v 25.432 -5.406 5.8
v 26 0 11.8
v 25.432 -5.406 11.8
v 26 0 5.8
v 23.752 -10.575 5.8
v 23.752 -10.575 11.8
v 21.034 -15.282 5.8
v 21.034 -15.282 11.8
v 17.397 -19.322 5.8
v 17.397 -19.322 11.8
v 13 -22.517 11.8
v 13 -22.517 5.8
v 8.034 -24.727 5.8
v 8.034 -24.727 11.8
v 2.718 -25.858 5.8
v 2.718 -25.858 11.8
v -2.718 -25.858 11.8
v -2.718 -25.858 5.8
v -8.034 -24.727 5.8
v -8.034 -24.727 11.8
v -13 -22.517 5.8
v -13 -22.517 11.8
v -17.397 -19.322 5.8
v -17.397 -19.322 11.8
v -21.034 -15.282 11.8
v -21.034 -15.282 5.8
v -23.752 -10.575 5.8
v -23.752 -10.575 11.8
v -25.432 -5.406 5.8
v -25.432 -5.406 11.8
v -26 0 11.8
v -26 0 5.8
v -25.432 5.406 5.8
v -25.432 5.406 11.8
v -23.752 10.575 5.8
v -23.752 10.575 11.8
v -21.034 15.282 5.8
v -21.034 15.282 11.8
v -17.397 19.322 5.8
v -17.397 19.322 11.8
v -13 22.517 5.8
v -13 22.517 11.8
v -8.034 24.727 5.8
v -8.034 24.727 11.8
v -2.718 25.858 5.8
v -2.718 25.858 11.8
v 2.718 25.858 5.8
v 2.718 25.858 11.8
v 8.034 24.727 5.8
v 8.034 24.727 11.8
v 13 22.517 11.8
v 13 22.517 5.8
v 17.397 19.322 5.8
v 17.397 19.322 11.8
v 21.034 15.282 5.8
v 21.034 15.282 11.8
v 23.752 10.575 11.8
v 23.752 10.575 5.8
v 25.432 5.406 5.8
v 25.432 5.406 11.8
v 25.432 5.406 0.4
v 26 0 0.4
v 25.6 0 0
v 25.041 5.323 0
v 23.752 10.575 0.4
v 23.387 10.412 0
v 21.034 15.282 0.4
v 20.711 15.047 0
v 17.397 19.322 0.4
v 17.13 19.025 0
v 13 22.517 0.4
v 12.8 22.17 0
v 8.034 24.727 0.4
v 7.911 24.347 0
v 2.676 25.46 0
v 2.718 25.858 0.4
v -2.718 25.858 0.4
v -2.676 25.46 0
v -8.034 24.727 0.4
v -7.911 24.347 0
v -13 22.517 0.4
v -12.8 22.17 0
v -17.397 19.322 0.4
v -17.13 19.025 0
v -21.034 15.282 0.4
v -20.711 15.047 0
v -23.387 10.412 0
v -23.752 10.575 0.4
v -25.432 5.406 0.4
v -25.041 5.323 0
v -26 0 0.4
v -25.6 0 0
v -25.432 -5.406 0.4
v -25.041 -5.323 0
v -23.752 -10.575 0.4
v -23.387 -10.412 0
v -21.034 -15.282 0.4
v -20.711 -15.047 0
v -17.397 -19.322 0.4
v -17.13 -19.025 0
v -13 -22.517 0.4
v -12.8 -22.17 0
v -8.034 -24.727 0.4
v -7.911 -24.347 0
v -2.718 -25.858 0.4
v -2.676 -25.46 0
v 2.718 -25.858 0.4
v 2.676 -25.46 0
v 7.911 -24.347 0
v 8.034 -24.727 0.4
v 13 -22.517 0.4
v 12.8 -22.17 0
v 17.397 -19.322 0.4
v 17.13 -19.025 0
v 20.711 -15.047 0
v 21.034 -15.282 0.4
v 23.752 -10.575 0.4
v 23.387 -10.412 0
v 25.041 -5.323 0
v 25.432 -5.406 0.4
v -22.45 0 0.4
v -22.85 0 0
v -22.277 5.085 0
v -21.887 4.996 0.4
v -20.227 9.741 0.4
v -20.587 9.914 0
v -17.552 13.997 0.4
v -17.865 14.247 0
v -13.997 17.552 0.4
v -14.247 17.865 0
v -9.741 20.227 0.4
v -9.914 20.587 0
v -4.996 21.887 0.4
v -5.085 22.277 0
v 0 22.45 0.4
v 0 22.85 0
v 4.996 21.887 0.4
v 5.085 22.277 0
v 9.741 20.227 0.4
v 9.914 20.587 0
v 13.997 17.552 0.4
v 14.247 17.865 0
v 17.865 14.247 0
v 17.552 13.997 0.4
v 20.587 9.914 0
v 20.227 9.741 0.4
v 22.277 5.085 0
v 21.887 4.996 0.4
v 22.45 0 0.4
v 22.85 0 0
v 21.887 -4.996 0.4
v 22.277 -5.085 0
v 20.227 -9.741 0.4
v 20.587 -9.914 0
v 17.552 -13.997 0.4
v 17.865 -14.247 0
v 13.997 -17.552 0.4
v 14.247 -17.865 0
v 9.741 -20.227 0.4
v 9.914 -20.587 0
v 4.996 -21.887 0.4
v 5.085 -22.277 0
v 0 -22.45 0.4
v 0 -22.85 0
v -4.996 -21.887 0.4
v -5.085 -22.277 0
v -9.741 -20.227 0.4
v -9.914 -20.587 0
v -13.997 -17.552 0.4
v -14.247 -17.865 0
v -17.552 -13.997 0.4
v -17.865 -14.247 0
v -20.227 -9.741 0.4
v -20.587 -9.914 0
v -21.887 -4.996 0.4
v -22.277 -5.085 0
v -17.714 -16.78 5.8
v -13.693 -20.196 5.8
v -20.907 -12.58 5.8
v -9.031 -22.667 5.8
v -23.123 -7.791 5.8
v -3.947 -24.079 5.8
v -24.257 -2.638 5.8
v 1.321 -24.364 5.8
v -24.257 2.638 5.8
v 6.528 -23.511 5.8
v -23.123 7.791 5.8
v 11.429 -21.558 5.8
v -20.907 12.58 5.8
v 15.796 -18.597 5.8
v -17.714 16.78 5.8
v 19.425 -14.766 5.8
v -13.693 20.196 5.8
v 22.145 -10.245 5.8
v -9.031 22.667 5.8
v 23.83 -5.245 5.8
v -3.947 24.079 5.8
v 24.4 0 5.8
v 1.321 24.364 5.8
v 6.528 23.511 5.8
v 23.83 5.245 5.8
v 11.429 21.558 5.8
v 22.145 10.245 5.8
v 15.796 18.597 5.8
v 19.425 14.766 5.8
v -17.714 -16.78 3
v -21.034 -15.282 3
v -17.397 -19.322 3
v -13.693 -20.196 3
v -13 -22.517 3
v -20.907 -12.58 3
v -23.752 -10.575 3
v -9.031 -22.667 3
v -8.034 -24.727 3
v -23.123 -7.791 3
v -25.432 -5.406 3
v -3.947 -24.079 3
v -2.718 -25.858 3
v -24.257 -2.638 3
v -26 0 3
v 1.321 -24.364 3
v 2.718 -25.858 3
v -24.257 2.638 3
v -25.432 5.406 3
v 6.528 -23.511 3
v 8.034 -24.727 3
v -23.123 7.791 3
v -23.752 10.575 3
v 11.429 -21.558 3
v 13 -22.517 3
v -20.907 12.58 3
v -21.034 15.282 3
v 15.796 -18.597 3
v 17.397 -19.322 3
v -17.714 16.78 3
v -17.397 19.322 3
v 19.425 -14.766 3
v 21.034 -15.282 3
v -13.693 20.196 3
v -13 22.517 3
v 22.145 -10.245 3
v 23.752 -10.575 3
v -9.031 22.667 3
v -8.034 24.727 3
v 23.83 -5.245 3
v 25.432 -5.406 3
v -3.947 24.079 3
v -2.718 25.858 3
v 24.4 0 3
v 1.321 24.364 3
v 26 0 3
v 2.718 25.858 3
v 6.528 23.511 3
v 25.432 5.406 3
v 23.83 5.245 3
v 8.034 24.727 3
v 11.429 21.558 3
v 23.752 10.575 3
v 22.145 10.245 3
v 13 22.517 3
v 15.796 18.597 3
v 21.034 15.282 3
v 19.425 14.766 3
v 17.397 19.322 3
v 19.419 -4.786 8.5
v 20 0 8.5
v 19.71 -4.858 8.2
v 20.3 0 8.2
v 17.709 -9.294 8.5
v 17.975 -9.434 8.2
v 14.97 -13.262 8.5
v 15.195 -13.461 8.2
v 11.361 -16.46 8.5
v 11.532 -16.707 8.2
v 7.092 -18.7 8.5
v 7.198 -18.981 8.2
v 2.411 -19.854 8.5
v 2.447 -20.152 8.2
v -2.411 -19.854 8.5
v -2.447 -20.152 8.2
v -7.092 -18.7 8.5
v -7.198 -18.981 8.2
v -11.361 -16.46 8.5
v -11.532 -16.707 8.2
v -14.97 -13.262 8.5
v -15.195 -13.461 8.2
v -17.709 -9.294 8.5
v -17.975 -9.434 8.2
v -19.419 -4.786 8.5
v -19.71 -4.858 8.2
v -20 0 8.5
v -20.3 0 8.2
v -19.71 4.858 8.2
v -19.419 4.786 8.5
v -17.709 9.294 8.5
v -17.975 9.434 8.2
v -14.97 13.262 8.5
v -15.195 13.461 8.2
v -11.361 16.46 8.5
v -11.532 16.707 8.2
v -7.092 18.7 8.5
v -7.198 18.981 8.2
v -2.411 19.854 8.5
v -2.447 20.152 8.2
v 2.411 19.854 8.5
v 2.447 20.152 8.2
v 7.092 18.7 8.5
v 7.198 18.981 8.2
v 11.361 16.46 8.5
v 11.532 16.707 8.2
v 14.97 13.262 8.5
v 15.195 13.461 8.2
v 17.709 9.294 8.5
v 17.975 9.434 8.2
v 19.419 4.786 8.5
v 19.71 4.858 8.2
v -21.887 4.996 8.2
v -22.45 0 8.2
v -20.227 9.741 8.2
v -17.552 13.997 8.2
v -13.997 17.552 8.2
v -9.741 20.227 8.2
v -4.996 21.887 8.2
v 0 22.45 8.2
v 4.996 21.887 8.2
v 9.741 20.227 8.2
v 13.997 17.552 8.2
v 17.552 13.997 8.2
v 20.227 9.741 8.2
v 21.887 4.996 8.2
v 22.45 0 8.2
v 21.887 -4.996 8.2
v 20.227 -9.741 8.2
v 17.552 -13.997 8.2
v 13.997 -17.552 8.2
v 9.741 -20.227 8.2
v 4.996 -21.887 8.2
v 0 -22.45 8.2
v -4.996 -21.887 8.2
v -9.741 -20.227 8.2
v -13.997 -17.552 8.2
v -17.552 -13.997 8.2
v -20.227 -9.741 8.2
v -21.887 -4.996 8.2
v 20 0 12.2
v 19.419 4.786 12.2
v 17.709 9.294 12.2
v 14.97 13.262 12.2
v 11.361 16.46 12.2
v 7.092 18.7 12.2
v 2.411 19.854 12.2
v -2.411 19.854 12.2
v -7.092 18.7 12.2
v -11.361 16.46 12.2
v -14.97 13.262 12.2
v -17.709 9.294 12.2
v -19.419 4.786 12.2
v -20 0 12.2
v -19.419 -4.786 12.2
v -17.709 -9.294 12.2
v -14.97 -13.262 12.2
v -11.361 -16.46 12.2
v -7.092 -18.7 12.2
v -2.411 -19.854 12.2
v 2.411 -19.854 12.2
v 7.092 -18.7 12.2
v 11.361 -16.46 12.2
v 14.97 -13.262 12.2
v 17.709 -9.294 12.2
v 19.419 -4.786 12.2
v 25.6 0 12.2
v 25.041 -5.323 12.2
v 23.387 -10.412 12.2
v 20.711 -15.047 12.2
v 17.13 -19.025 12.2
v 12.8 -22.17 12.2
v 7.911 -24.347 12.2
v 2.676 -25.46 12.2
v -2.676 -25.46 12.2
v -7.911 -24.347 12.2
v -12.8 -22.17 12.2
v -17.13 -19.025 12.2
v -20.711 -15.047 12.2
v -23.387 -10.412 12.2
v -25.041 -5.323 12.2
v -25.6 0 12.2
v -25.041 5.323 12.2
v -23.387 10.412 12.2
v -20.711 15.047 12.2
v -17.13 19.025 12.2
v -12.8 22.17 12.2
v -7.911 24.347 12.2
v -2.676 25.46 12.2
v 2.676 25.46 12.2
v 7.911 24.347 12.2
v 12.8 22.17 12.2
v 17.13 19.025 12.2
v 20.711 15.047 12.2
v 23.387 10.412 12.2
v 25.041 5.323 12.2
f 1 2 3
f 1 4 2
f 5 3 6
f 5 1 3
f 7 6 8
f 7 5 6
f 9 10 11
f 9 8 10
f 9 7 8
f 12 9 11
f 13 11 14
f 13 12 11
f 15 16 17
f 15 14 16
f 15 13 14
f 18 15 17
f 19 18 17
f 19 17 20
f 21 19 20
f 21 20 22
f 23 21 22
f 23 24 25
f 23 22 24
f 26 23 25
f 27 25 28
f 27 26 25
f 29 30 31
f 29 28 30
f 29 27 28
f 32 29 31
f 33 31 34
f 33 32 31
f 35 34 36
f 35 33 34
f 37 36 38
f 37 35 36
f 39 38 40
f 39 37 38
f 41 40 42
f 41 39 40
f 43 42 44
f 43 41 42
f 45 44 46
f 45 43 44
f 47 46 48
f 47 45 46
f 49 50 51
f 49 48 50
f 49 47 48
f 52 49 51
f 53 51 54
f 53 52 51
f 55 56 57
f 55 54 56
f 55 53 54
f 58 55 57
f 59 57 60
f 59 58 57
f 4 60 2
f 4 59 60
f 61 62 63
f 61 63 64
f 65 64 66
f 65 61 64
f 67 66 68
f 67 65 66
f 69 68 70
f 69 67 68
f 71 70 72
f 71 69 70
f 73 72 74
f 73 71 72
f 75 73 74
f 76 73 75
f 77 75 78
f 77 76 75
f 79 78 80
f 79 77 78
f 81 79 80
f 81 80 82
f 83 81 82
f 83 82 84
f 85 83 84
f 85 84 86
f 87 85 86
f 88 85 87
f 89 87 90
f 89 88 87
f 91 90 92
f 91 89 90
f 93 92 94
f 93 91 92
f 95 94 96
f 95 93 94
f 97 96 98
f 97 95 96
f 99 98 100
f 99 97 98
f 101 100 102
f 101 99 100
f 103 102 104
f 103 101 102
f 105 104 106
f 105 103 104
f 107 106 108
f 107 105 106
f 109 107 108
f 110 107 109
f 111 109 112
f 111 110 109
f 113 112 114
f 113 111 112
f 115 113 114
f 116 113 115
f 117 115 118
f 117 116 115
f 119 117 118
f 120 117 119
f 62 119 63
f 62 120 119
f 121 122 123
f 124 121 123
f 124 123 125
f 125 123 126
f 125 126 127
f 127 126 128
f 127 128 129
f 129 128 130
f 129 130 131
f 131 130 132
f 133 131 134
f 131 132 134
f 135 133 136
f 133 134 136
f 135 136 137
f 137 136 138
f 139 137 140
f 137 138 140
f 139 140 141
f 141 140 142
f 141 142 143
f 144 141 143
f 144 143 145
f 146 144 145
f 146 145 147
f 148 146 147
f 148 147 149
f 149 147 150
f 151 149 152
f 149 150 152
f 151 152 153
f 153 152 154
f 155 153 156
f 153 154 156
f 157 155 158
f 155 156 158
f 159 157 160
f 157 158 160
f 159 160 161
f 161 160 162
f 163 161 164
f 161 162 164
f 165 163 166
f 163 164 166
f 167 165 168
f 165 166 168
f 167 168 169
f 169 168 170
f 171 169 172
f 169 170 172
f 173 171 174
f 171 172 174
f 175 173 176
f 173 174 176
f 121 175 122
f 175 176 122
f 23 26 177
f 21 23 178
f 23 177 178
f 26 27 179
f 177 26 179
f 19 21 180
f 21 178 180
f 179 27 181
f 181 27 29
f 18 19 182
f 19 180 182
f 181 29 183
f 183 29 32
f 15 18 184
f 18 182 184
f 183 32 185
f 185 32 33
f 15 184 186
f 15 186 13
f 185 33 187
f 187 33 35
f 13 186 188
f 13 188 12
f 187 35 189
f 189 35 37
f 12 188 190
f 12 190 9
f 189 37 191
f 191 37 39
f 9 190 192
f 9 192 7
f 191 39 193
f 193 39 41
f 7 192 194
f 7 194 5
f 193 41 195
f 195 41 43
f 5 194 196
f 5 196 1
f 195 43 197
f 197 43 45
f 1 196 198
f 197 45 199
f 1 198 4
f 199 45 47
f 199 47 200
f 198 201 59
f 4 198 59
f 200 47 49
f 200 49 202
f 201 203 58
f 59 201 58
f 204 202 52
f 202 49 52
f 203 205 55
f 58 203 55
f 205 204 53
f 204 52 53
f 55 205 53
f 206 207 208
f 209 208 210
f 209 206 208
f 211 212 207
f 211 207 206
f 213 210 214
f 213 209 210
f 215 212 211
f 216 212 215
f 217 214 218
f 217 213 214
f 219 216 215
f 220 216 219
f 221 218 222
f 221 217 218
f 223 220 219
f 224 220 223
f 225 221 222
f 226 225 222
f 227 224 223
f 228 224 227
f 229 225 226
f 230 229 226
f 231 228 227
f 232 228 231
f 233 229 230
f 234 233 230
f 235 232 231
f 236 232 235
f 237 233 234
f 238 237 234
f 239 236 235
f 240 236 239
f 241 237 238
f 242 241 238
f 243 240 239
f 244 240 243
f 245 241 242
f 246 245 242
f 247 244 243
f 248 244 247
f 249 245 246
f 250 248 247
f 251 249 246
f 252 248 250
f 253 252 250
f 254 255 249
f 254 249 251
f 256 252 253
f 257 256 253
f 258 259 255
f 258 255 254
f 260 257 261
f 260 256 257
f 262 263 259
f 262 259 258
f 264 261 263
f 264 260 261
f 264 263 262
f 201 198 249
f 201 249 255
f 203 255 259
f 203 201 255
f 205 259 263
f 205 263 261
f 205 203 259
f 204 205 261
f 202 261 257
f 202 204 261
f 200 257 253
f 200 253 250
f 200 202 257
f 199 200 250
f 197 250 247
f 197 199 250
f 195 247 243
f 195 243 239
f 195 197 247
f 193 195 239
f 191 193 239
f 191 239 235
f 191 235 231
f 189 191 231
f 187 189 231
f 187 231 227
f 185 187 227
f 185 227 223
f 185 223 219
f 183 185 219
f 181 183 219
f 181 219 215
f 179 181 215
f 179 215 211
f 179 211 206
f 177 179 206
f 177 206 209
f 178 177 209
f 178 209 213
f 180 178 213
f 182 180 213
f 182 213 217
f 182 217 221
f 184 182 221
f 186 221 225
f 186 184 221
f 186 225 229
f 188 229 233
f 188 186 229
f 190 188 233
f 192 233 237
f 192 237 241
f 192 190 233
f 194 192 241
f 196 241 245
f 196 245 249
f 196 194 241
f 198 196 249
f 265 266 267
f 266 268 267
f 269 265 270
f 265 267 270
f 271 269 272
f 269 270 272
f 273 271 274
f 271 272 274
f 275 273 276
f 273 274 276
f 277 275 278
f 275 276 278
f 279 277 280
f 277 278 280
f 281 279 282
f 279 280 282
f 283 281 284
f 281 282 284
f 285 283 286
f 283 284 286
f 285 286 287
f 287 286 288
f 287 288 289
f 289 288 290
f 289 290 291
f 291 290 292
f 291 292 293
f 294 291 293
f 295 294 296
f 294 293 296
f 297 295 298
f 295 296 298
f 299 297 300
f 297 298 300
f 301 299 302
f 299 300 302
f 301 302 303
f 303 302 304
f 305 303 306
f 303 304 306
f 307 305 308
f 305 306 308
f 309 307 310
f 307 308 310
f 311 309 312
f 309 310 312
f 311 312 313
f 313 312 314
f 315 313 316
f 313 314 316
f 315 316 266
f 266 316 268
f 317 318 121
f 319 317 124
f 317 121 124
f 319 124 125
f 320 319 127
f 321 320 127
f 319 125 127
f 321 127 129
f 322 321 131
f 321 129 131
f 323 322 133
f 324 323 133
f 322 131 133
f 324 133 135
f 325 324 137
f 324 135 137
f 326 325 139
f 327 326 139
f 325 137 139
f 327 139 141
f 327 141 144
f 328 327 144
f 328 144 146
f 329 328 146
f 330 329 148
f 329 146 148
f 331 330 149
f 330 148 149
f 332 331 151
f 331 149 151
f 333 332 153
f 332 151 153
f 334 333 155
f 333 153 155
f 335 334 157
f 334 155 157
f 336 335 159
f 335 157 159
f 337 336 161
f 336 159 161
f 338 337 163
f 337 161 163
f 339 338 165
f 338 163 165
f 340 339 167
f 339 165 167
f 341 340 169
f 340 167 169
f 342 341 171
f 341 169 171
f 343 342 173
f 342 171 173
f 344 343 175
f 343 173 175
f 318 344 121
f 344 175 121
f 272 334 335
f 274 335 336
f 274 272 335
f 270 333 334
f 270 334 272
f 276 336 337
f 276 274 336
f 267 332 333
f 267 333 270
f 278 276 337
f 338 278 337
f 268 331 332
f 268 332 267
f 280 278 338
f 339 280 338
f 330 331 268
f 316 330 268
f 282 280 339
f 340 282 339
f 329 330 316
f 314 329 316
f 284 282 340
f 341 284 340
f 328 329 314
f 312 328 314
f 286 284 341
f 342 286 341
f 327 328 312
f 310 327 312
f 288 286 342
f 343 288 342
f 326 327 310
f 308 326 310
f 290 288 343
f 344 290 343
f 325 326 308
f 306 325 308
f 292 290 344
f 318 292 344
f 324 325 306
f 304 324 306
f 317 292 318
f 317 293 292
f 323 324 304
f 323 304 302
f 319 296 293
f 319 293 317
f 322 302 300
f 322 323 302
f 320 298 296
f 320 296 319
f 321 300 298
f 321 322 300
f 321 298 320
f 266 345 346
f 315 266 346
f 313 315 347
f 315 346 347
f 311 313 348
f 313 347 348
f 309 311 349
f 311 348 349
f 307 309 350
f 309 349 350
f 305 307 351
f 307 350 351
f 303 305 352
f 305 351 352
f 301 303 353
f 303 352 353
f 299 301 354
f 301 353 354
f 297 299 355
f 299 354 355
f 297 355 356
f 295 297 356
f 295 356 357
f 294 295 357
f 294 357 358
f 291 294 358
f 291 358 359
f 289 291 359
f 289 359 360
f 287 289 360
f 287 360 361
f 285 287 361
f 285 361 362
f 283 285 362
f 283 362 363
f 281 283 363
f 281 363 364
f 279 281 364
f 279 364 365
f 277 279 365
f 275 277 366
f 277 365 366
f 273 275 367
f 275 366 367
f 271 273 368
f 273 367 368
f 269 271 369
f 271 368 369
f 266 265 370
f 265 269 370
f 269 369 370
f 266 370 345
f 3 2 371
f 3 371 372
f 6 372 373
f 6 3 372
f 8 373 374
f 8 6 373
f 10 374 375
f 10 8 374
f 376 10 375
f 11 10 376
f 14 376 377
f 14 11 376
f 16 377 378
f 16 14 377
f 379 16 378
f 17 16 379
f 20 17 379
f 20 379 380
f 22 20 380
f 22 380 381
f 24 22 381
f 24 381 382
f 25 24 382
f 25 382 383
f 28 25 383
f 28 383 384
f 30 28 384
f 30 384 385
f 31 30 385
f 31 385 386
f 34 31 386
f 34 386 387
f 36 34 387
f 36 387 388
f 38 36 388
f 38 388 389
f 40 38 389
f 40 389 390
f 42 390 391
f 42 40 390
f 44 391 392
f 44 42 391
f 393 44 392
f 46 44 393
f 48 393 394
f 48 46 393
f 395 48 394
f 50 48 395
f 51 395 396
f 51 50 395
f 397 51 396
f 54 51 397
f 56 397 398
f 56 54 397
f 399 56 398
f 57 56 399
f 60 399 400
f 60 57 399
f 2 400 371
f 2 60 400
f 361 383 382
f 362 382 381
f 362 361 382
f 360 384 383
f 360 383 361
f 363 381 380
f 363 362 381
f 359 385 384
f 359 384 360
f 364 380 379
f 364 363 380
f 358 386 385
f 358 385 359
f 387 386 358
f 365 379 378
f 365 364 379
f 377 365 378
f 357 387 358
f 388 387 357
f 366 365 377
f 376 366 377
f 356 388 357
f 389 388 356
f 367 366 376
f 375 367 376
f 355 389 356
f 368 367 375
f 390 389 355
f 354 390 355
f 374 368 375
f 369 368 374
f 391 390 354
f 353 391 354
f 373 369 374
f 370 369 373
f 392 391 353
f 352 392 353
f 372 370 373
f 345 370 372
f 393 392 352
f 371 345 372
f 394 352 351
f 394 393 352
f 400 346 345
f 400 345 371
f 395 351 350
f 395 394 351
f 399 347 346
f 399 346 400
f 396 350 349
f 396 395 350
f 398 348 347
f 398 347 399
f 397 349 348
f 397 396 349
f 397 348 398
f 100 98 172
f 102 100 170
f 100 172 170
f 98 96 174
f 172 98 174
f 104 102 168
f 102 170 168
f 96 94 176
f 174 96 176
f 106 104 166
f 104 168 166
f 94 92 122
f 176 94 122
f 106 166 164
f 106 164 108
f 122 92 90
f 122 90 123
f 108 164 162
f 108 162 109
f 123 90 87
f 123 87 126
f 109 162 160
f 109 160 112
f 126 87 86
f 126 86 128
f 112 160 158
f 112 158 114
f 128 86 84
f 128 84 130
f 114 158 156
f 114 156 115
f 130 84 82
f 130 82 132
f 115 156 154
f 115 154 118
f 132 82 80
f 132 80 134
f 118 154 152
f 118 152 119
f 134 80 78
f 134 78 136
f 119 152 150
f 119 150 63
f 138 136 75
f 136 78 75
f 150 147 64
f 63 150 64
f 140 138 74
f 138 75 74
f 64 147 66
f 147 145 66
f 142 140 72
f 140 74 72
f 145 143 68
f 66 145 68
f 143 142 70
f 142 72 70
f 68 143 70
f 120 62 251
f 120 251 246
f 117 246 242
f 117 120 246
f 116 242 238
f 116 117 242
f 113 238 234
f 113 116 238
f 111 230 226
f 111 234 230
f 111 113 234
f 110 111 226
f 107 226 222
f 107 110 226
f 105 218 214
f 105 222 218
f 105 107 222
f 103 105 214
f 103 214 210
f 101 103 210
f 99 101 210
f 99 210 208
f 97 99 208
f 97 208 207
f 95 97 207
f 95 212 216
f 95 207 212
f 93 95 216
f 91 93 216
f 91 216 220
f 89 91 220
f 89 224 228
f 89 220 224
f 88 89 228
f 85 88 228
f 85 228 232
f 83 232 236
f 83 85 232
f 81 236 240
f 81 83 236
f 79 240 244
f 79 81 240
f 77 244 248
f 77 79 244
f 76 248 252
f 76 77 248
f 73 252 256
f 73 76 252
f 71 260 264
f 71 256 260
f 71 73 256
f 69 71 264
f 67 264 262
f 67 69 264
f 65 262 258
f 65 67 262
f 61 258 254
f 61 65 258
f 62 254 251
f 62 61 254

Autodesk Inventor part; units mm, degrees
ref_plane "YZ Plane" through (0, 0, 0) normal (1, 0, 0) x (0, 1, 0)
ref_plane "XZ Plane" through (0, 0, 0) normal (0, 1, 0) x (-1, 0, 0)
sketch "草圖1" plane through (0, 0, 0) normal (0, 0, 1) x (1, 0, 0)
  circle A0 centre (0, 0) radius 26
  dimension "d0" = 52
extrude "擠出1" add sketch "草圖1" along normal blind 12.2
sketch "草圖2" plane through (0, 0, 12.2) normal (0, 0, 1) x (1, 0, 0)
  circle A0 centre (0, 0) radius 26 projected
  circle A1 centre (0, 0) radius 20
  dimension "d3" = 40
extrude "擠出2" cut sketch "草圖2" against normal through all contours A1
sketch "草圖3" plane through (0, 0, 0) normal (0, 0, -1) x (-1, 0, 0)
  circle A0 centre (0, 0) radius 20 projected
  circle A1 centre (0, 0) radius 26 projected
  circle A2 centre (0, 0) radius 22.45
  dimension "d6" = 44.9
extrude "擠出3" cut sketch "草圖3" against normal blind 8.2 contours A2
ref_plane "工作平面1" through (0, 0, 5.8) normal (0, 0, 1) x (1, 0, 0)
sketch "草圖4" plane through (0, 0, 5.8) normal (0, 0, 1) x (1, 0, 0)
  circle A0 centre (0, 0) radius 24.4
  circle A1 centre (0, 0) radius 26 projected
  dimension "d10" = 48.8
extrude "擠出4" cut sketch "草圖4" against normal blind 2.8
chamfer "倒角1" distance 0.4 angle 45 3 edges at (-26, 0, 12.2) (-26, 0, 0) (22.45, 0, 0)
chamfer "倒角2" distance 0.3 angle 45 1 edges at (-20, 0, 8.2)
properties part number "鑄鐵SLEEVE"
